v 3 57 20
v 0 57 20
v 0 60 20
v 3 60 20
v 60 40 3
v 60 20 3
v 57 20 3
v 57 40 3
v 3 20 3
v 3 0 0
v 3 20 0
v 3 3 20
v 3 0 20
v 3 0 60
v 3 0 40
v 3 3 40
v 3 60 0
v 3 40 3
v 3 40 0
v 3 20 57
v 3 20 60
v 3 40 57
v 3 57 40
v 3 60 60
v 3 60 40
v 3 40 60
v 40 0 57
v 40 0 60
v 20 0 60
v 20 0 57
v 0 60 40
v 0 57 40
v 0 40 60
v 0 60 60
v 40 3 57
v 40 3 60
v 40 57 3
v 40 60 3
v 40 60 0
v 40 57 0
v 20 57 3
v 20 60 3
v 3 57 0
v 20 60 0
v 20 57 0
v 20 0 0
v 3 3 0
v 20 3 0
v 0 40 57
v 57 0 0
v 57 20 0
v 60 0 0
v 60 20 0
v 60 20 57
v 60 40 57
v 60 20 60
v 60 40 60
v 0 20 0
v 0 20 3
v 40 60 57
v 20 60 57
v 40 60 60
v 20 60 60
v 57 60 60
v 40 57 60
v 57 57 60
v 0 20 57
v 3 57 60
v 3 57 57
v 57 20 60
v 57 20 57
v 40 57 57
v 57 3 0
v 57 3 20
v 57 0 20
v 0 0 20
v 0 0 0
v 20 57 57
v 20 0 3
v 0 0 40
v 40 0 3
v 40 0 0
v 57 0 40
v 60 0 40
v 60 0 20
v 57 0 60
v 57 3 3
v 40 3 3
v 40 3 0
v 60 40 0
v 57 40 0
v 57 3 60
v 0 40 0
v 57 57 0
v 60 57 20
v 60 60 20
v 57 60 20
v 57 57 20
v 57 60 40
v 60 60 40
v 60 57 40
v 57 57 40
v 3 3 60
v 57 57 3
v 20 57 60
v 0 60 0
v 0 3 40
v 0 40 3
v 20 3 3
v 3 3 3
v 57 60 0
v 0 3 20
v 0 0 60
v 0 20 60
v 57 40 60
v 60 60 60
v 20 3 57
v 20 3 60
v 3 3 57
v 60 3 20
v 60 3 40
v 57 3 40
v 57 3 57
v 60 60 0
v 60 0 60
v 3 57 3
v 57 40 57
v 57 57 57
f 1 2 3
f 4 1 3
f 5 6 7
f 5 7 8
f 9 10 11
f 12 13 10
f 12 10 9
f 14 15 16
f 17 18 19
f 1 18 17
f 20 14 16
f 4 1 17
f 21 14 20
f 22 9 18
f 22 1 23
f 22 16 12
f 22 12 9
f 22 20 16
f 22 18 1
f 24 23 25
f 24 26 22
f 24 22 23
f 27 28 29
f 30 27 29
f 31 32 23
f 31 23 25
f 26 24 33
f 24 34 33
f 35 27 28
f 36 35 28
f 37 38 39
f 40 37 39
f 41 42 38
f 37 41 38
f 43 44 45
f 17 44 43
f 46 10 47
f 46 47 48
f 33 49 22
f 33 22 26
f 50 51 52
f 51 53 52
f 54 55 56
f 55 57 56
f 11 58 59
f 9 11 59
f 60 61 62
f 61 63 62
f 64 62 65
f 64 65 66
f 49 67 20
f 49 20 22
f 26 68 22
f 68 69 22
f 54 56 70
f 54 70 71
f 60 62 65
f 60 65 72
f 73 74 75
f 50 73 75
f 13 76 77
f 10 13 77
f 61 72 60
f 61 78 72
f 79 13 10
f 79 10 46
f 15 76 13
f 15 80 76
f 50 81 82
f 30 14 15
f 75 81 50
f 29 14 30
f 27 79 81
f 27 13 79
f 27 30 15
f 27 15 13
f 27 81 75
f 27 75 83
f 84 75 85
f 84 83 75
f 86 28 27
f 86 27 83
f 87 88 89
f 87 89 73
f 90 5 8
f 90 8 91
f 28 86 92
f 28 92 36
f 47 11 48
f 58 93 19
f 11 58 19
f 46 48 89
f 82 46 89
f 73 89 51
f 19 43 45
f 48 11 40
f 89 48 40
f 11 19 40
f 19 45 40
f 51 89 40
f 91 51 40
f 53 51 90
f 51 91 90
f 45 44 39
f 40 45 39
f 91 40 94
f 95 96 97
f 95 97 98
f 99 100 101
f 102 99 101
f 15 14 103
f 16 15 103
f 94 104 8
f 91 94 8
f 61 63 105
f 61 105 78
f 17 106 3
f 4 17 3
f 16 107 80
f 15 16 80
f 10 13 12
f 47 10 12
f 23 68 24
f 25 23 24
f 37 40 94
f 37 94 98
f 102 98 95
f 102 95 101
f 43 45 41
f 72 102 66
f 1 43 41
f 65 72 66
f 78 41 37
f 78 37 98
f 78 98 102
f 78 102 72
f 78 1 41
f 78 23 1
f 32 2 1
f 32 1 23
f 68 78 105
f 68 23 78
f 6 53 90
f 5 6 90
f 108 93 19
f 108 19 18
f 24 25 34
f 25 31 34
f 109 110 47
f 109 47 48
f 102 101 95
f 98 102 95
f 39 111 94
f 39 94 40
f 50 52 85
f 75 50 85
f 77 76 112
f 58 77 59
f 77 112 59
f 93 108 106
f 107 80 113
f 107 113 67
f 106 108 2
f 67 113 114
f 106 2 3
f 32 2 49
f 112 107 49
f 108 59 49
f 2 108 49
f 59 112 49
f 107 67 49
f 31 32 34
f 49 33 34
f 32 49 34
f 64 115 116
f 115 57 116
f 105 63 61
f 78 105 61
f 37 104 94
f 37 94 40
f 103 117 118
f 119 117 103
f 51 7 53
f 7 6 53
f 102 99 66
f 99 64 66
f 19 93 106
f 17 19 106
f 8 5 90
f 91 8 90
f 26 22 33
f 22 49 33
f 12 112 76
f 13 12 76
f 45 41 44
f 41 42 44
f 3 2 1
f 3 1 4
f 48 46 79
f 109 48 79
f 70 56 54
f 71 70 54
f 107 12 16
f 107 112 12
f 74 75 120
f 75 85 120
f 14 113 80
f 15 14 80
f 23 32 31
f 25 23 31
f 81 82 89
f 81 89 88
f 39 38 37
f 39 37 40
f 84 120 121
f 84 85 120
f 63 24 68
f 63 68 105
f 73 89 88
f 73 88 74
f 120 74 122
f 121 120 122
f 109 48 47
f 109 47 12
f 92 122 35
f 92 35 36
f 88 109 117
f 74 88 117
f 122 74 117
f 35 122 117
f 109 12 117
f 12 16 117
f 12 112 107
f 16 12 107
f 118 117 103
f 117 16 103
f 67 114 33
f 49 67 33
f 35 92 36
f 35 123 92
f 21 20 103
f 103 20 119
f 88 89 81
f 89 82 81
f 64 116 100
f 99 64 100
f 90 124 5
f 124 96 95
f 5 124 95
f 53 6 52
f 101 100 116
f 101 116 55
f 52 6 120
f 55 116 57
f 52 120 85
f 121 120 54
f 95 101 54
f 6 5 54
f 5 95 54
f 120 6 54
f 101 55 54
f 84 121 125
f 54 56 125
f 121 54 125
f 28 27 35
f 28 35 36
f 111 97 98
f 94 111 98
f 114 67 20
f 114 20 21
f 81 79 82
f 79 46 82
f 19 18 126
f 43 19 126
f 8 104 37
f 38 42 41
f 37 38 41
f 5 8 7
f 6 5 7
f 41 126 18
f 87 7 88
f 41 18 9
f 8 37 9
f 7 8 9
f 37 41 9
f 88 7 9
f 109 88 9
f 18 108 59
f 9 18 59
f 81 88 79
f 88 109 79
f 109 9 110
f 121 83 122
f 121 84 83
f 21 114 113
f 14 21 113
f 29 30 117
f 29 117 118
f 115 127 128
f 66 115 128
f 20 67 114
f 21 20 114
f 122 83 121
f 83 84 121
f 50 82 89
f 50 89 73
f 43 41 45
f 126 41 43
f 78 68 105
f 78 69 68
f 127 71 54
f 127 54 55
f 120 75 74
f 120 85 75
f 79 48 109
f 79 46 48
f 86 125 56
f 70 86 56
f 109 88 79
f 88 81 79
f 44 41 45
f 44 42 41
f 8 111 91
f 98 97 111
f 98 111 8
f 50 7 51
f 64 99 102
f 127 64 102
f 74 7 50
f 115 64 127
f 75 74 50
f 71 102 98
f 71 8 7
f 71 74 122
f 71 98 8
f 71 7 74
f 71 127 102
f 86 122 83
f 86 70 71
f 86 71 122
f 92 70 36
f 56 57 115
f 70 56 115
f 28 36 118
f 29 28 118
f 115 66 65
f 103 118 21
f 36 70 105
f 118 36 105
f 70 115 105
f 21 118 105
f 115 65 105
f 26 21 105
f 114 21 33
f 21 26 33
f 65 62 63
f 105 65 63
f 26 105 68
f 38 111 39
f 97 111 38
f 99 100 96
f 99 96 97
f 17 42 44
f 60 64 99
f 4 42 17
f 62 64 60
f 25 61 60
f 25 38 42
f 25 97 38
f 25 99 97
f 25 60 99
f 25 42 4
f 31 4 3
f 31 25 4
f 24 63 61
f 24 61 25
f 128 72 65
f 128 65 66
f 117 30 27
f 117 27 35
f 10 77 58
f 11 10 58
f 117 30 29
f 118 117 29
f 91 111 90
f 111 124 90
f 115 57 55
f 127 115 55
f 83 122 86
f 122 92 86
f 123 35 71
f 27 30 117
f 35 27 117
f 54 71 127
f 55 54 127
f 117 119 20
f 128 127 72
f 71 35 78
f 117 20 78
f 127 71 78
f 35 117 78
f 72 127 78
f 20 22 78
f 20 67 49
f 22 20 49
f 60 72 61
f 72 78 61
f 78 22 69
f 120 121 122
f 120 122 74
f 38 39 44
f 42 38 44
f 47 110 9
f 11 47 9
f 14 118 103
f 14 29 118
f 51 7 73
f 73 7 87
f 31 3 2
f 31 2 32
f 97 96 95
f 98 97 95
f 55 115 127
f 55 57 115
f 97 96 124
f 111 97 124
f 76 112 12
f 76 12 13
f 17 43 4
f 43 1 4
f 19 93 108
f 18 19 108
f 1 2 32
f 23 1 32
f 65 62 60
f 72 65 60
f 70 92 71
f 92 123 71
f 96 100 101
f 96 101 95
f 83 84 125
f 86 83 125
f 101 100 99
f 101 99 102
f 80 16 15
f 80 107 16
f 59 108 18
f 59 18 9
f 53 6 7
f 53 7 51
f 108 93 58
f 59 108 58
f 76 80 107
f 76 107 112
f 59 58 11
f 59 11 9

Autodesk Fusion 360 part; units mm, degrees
sketch "bottom sketch" plane through (0, 0, 0) normal (0, 0, 1) x (1, 0, 0)
  line L0 (0, 0) -> (60, 0)
  line L1 (60, 0) -> (60, 60)
  line L2 (60, 60) -> (0, 60)
  line L3 (0, 60) -> (0, 0)
  dimension "d8" = 60
  dimension "d9" = 60
extrude "Extrude1" add sketch "bottom sketch" along normal blind 3 makes body 1
sketch "front sketch" plane through (0, 0, 0) normal (0, -1, 0) x (1, 0, 0)
  line L0 (0, 0) -> (60, 0)
  line L1 (60, 0) -> (60, 3)
  line L2 (60, 3) -> (0, 3)
  line L3 (0, 3) -> (0, 0)
  line L4 (0, 0) -> (60, 0)
  line L5 (60, 0) -> (60, 60)
  line L6 (60, 60) -> (0, 60)
  line L7 (0, 60) -> (0, 0)
  line L8 (0, 0) -> (20, 0)
  line L9 (20, 0) -> (20, 3)
  line L10 (20, 3) -> (0, 3)
  line L11 (0, 3) -> (0, 0)
  line L12 (20, 0) -> (40, 0)
  line L13 (40, 0) -> (40, 3)
  line L14 (40, 3) -> (20, 3)
  line L15 (20, 3) -> (20, 0)
  dimension "d12" = 60
  dimension "d13" = 60
  dimension "d14" = 20
  dimension "d15" = 20
extrude "Extrude2" add sketch "front sketch" against normal blind 3 separate body contours L0 L2 L3 L4 L7 L8 L9 L10 L11 L15 | L2 L5 L6 L7 L10 L14 | L0 L1 L2 L4 L5 L13 makes body 2
combine "Combine1" operation cut target body 1 tool bodies 2 keep tools
ref_plane "WorkPlane1" through (30, 30, 1.5) normal (0, 1, 0) x (-1, 0, 0)
mirror "Mirror1" about plane through (30, 30, 1.5) normal (0, 1, 0) of bodies 2 makes body 3
combine "Combine2" operation cut target body 1 tool bodies 3 keep tools
sketch "left sketch" plane through (0, 0, 0) normal (1, 0, 0) x (0, 1, 0)
  line L0 (0, 0) -> (60, 0)
  line L1 (60, 0) -> (60, 60)
  line L2 (60, 60) -> (0, 60)
  line L3 (0, 60) -> (0, 0)
  line L4 (0, 0) -> (20, 0)
  line L5 (20, 0) -> (20, 3)
  line L6 (20, 3) -> (0, 3)
  line L7 (0, 3) -> (0, 0)
  line L8 (57, 3) -> (3, 3)
  line L9 (20, 0) -> (40, 0)
  line L10 (40, 0) -> (40, 3)
  line L11 (40, 3) -> (20, 3)
  line L12 (20, 3) -> (20, 0)
  line L13 (0, 0) -> (3, 0)
  line L14 (3, 0) -> (3, 20)
  line L15 (3, 20) -> (0, 20)
  line L16 (0, 20) -> (0, 0)
  line L17 (0, 20) -> (3, 20)
  line L18 (3, 20) -> (3, 40)
  line L19 (3, 40) -> (0, 40)
  line L20 (0, 40) -> (0, 20)
  line L21 (60, 0) -> (57, 0)
  line L22 (57, 0) -> (57, 20)
  line L23 (57, 20) -> (60, 20)
  line L24 (60, 20) -> (60, 0)
  line L25 (60, 20) -> (57, 20)
  line L26 (57, 20) -> (57, 40)
  line L27 (57, 40) -> (60, 40)
  line L28 (60, 40) -> (60, 20)
  dimension "d19" = 60
  dimension "d20" = 60
  dimension "d21" = 20
  dimension "d22" = 20
  dimension "d23" = 3
  dimension "d24" = 20
  dimension "d25" = 3
  dimension "d26" = 20
  dimension "d27" = 3
  dimension "d28" = 20
  dimension "d29" = 3
  dimension "d30" = 20
extrude "Extrude3" add sketch "left sketch" along normal blind 3 separate body contours L0 L3 L4 L6 L7 L13 L14 L16 | L0 L4 L5 L6 L8 L12 L14 | L3 L6 L14 L15 L16 L17 | L1 L2 L3 L6 L8 L11 L14 L18 L19 L22 L26 L27 | L0 L8 L10 L22 | L0 L1 L21 L22 L23 L24 L25 makes body 4
combine "Combine3" operation cut target body 1 tool bodies 4 keep tools
ref_plane "WorkPlane2" through (30, 30, 1.5) normal (-1, 0, 0) x (0, -1, 0)
mirror "Mirror2" about plane through (30, 30, 1.5) normal (-1, 0, 0) of bodies 4 makes body 5
combine "Combine4" operation cut target body 1 tool bodies 5 keep tools
combine "Combine5" operation cut target body 3 tool bodies 5 4 keep tools
combine "Combine6" operation cut target body 2 tool bodies 5 4 keep tools
ref_plane "WorkPlane3" through (30, 30, 30) normal (0, 0, -1) x (-1, 0, 0)
mirror "Mirror3" about plane through (30, 30, 30) normal (0, 0, -1) of bodies 1 makes body 6
combine "Combine7" operation cut target body 2 tool bodies 6 keep tools
combine "Combine8" operation cut target body 5 tool bodies 6 keep tools
combine "Combine9" operation cut target body 3 tool bodies 6 keep tools
combine "Combine10" operation cut target body 4 tool bodies 6 keep tools
sketch "top-dxf" plane through (0, 0, 60) normal (0, 0, 1) x (-1, 0, 0)
  line L0 (-57, -40) -> (-57, -57)
  line L1 (-57, -57) -> (-40, -57)
  line L2 (-40, -57) -> (-40, -60)
  line L3 (-40, -60) -> (-20, -60)
  line L4 (-20, -60) -> (-20, -57)
  line L5 (-20, -57) -> (-3, -57)
  line L6 (-3, -57) -> (-3, -40)
  line L7 (-3, -40) -> (0, -40)
  line L8 (0, -40) -> (0, -20)
  line L9 (0, -20) -> (-3, -20)
  line L10 (-3, -20) -> (-3, -3)
  line L11 (-3, -3) -> (-20, -3)
  line L12 (-20, -3) -> (-20, 0)
  line L13 (-20, 0) -> (-40, 0)
  line L14 (-40, 0) -> (-40, -3)
  line L15 (-40, -3) -> (-57, -3)
  line L16 (-57, -3) -> (-57, -20)
  line L17 (-57, -20) -> (-60, -20)
  line L18 (-60, -20) -> (-60, -40)
  line L19 (-60, -40) -> (-57, -40)
sketch "right-dxf" plane through (60, 0, 0) normal (1, 0, 0) x (0, 1, 0)
  line L0 (20, 57) -> (20, 60)
  line L1 (20, 60) -> (0, 60)
  line L2 (0, 60) -> (0, 40)
  line L3 (0, 40) -> (3, 40)
  line L4 (3, 40) -> (3, 20)
  line L5 (3, 20) -> (0, 20)
  line L6 (0, 20) -> (0, 0)
  line L7 (0, 0) -> (20, 0)
  line L8 (20, 0) -> (20, 3)
  line L9 (20, 3) -> (40, 3)
  line L10 (40, 3) -> (40, 0)
  line L11 (40, 0) -> (60, 0)
  line L12 (60, 0) -> (60, 20)
  line L13 (60, 20) -> (57, 20)
  line L14 (57, 20) -> (57, 40)
  line L15 (57, 40) -> (60, 40)
  line L16 (60, 40) -> (60, 60)
  line L17 (60, 60) -> (40, 60)
  line L18 (40, 60) -> (40, 57)
  line L19 (40, 57) -> (20, 57)
sketch "back-dxf" plane through (0, 60, 0) normal (0, 1, 0) x (-1, 0, 0)
  line L0 (-40, 57) -> (-40, 60)
  line L1 (-40, 60) -> (-57, 60)
  line L2 (-57, 60) -> (-57, 40)
  line L3 (-57, 40) -> (-60, 40)
  line L4 (-60, 40) -> (-60, 20)
  line L5 (-60, 20) -> (-57, 20)
  line L6 (-57, 20) -> (-57, 0)
  line L7 (-57, 0) -> (-40, 0)
  line L8 (-40, 0) -> (-40, 3)
  line L9 (-40, 3) -> (-20, 3)
  line L10 (-20, 3) -> (-20, 0)
  line L11 (-20, 0) -> (-3, 0)
  line L12 (-3, 0) -> (-3, 20)
  line L13 (-3, 20) -> (0, 20)
  line L14 (0, 20) -> (0, 40)
  line L15 (0, 40) -> (-3, 40)
  line L16 (-3, 40) -> (-3, 60)
  line L17 (-3, 60) -> (-20, 60)
  line L18 (-20, 60) -> (-20, 57)
  line L19 (-20, 57) -> (-40, 57)
equation "length = 60 mm" comment "cube length"
equation "width = 60 mm" comment "cube width"
equation "height = 60 mm" comment "cube height"
equation "thickness = 3 mm" comment "thickness"
equation "fingerL = length / 3" comment "finger on length"
equation "fingerW = width / 3" comment "finger on width"
equation "fingerH = height / 3" comment "finger on height"
equation "d8 = length"
equation "d9 = width"
equation "d10 = thickness"
equation "d12 = length"
equation "d13 = height"
equation "d14 = fingerL"
equation "d15 = fingerL"
equation "d16 = -thickness"
equation "d19 = width"
equation "d20 = height"
equation "d21 = fingerW"
equation "d22 = fingerW"
equation "d23 = thickness"
equation "d24 = fingerH"
equation "d25 = thickness"
equation "d26 = fingerH"
equation "d27 = thickness"
equation "d28 = fingerH"
equation "d29 = thickness"
equation "d30 = fingerH"
equation "d31 = thickness"
